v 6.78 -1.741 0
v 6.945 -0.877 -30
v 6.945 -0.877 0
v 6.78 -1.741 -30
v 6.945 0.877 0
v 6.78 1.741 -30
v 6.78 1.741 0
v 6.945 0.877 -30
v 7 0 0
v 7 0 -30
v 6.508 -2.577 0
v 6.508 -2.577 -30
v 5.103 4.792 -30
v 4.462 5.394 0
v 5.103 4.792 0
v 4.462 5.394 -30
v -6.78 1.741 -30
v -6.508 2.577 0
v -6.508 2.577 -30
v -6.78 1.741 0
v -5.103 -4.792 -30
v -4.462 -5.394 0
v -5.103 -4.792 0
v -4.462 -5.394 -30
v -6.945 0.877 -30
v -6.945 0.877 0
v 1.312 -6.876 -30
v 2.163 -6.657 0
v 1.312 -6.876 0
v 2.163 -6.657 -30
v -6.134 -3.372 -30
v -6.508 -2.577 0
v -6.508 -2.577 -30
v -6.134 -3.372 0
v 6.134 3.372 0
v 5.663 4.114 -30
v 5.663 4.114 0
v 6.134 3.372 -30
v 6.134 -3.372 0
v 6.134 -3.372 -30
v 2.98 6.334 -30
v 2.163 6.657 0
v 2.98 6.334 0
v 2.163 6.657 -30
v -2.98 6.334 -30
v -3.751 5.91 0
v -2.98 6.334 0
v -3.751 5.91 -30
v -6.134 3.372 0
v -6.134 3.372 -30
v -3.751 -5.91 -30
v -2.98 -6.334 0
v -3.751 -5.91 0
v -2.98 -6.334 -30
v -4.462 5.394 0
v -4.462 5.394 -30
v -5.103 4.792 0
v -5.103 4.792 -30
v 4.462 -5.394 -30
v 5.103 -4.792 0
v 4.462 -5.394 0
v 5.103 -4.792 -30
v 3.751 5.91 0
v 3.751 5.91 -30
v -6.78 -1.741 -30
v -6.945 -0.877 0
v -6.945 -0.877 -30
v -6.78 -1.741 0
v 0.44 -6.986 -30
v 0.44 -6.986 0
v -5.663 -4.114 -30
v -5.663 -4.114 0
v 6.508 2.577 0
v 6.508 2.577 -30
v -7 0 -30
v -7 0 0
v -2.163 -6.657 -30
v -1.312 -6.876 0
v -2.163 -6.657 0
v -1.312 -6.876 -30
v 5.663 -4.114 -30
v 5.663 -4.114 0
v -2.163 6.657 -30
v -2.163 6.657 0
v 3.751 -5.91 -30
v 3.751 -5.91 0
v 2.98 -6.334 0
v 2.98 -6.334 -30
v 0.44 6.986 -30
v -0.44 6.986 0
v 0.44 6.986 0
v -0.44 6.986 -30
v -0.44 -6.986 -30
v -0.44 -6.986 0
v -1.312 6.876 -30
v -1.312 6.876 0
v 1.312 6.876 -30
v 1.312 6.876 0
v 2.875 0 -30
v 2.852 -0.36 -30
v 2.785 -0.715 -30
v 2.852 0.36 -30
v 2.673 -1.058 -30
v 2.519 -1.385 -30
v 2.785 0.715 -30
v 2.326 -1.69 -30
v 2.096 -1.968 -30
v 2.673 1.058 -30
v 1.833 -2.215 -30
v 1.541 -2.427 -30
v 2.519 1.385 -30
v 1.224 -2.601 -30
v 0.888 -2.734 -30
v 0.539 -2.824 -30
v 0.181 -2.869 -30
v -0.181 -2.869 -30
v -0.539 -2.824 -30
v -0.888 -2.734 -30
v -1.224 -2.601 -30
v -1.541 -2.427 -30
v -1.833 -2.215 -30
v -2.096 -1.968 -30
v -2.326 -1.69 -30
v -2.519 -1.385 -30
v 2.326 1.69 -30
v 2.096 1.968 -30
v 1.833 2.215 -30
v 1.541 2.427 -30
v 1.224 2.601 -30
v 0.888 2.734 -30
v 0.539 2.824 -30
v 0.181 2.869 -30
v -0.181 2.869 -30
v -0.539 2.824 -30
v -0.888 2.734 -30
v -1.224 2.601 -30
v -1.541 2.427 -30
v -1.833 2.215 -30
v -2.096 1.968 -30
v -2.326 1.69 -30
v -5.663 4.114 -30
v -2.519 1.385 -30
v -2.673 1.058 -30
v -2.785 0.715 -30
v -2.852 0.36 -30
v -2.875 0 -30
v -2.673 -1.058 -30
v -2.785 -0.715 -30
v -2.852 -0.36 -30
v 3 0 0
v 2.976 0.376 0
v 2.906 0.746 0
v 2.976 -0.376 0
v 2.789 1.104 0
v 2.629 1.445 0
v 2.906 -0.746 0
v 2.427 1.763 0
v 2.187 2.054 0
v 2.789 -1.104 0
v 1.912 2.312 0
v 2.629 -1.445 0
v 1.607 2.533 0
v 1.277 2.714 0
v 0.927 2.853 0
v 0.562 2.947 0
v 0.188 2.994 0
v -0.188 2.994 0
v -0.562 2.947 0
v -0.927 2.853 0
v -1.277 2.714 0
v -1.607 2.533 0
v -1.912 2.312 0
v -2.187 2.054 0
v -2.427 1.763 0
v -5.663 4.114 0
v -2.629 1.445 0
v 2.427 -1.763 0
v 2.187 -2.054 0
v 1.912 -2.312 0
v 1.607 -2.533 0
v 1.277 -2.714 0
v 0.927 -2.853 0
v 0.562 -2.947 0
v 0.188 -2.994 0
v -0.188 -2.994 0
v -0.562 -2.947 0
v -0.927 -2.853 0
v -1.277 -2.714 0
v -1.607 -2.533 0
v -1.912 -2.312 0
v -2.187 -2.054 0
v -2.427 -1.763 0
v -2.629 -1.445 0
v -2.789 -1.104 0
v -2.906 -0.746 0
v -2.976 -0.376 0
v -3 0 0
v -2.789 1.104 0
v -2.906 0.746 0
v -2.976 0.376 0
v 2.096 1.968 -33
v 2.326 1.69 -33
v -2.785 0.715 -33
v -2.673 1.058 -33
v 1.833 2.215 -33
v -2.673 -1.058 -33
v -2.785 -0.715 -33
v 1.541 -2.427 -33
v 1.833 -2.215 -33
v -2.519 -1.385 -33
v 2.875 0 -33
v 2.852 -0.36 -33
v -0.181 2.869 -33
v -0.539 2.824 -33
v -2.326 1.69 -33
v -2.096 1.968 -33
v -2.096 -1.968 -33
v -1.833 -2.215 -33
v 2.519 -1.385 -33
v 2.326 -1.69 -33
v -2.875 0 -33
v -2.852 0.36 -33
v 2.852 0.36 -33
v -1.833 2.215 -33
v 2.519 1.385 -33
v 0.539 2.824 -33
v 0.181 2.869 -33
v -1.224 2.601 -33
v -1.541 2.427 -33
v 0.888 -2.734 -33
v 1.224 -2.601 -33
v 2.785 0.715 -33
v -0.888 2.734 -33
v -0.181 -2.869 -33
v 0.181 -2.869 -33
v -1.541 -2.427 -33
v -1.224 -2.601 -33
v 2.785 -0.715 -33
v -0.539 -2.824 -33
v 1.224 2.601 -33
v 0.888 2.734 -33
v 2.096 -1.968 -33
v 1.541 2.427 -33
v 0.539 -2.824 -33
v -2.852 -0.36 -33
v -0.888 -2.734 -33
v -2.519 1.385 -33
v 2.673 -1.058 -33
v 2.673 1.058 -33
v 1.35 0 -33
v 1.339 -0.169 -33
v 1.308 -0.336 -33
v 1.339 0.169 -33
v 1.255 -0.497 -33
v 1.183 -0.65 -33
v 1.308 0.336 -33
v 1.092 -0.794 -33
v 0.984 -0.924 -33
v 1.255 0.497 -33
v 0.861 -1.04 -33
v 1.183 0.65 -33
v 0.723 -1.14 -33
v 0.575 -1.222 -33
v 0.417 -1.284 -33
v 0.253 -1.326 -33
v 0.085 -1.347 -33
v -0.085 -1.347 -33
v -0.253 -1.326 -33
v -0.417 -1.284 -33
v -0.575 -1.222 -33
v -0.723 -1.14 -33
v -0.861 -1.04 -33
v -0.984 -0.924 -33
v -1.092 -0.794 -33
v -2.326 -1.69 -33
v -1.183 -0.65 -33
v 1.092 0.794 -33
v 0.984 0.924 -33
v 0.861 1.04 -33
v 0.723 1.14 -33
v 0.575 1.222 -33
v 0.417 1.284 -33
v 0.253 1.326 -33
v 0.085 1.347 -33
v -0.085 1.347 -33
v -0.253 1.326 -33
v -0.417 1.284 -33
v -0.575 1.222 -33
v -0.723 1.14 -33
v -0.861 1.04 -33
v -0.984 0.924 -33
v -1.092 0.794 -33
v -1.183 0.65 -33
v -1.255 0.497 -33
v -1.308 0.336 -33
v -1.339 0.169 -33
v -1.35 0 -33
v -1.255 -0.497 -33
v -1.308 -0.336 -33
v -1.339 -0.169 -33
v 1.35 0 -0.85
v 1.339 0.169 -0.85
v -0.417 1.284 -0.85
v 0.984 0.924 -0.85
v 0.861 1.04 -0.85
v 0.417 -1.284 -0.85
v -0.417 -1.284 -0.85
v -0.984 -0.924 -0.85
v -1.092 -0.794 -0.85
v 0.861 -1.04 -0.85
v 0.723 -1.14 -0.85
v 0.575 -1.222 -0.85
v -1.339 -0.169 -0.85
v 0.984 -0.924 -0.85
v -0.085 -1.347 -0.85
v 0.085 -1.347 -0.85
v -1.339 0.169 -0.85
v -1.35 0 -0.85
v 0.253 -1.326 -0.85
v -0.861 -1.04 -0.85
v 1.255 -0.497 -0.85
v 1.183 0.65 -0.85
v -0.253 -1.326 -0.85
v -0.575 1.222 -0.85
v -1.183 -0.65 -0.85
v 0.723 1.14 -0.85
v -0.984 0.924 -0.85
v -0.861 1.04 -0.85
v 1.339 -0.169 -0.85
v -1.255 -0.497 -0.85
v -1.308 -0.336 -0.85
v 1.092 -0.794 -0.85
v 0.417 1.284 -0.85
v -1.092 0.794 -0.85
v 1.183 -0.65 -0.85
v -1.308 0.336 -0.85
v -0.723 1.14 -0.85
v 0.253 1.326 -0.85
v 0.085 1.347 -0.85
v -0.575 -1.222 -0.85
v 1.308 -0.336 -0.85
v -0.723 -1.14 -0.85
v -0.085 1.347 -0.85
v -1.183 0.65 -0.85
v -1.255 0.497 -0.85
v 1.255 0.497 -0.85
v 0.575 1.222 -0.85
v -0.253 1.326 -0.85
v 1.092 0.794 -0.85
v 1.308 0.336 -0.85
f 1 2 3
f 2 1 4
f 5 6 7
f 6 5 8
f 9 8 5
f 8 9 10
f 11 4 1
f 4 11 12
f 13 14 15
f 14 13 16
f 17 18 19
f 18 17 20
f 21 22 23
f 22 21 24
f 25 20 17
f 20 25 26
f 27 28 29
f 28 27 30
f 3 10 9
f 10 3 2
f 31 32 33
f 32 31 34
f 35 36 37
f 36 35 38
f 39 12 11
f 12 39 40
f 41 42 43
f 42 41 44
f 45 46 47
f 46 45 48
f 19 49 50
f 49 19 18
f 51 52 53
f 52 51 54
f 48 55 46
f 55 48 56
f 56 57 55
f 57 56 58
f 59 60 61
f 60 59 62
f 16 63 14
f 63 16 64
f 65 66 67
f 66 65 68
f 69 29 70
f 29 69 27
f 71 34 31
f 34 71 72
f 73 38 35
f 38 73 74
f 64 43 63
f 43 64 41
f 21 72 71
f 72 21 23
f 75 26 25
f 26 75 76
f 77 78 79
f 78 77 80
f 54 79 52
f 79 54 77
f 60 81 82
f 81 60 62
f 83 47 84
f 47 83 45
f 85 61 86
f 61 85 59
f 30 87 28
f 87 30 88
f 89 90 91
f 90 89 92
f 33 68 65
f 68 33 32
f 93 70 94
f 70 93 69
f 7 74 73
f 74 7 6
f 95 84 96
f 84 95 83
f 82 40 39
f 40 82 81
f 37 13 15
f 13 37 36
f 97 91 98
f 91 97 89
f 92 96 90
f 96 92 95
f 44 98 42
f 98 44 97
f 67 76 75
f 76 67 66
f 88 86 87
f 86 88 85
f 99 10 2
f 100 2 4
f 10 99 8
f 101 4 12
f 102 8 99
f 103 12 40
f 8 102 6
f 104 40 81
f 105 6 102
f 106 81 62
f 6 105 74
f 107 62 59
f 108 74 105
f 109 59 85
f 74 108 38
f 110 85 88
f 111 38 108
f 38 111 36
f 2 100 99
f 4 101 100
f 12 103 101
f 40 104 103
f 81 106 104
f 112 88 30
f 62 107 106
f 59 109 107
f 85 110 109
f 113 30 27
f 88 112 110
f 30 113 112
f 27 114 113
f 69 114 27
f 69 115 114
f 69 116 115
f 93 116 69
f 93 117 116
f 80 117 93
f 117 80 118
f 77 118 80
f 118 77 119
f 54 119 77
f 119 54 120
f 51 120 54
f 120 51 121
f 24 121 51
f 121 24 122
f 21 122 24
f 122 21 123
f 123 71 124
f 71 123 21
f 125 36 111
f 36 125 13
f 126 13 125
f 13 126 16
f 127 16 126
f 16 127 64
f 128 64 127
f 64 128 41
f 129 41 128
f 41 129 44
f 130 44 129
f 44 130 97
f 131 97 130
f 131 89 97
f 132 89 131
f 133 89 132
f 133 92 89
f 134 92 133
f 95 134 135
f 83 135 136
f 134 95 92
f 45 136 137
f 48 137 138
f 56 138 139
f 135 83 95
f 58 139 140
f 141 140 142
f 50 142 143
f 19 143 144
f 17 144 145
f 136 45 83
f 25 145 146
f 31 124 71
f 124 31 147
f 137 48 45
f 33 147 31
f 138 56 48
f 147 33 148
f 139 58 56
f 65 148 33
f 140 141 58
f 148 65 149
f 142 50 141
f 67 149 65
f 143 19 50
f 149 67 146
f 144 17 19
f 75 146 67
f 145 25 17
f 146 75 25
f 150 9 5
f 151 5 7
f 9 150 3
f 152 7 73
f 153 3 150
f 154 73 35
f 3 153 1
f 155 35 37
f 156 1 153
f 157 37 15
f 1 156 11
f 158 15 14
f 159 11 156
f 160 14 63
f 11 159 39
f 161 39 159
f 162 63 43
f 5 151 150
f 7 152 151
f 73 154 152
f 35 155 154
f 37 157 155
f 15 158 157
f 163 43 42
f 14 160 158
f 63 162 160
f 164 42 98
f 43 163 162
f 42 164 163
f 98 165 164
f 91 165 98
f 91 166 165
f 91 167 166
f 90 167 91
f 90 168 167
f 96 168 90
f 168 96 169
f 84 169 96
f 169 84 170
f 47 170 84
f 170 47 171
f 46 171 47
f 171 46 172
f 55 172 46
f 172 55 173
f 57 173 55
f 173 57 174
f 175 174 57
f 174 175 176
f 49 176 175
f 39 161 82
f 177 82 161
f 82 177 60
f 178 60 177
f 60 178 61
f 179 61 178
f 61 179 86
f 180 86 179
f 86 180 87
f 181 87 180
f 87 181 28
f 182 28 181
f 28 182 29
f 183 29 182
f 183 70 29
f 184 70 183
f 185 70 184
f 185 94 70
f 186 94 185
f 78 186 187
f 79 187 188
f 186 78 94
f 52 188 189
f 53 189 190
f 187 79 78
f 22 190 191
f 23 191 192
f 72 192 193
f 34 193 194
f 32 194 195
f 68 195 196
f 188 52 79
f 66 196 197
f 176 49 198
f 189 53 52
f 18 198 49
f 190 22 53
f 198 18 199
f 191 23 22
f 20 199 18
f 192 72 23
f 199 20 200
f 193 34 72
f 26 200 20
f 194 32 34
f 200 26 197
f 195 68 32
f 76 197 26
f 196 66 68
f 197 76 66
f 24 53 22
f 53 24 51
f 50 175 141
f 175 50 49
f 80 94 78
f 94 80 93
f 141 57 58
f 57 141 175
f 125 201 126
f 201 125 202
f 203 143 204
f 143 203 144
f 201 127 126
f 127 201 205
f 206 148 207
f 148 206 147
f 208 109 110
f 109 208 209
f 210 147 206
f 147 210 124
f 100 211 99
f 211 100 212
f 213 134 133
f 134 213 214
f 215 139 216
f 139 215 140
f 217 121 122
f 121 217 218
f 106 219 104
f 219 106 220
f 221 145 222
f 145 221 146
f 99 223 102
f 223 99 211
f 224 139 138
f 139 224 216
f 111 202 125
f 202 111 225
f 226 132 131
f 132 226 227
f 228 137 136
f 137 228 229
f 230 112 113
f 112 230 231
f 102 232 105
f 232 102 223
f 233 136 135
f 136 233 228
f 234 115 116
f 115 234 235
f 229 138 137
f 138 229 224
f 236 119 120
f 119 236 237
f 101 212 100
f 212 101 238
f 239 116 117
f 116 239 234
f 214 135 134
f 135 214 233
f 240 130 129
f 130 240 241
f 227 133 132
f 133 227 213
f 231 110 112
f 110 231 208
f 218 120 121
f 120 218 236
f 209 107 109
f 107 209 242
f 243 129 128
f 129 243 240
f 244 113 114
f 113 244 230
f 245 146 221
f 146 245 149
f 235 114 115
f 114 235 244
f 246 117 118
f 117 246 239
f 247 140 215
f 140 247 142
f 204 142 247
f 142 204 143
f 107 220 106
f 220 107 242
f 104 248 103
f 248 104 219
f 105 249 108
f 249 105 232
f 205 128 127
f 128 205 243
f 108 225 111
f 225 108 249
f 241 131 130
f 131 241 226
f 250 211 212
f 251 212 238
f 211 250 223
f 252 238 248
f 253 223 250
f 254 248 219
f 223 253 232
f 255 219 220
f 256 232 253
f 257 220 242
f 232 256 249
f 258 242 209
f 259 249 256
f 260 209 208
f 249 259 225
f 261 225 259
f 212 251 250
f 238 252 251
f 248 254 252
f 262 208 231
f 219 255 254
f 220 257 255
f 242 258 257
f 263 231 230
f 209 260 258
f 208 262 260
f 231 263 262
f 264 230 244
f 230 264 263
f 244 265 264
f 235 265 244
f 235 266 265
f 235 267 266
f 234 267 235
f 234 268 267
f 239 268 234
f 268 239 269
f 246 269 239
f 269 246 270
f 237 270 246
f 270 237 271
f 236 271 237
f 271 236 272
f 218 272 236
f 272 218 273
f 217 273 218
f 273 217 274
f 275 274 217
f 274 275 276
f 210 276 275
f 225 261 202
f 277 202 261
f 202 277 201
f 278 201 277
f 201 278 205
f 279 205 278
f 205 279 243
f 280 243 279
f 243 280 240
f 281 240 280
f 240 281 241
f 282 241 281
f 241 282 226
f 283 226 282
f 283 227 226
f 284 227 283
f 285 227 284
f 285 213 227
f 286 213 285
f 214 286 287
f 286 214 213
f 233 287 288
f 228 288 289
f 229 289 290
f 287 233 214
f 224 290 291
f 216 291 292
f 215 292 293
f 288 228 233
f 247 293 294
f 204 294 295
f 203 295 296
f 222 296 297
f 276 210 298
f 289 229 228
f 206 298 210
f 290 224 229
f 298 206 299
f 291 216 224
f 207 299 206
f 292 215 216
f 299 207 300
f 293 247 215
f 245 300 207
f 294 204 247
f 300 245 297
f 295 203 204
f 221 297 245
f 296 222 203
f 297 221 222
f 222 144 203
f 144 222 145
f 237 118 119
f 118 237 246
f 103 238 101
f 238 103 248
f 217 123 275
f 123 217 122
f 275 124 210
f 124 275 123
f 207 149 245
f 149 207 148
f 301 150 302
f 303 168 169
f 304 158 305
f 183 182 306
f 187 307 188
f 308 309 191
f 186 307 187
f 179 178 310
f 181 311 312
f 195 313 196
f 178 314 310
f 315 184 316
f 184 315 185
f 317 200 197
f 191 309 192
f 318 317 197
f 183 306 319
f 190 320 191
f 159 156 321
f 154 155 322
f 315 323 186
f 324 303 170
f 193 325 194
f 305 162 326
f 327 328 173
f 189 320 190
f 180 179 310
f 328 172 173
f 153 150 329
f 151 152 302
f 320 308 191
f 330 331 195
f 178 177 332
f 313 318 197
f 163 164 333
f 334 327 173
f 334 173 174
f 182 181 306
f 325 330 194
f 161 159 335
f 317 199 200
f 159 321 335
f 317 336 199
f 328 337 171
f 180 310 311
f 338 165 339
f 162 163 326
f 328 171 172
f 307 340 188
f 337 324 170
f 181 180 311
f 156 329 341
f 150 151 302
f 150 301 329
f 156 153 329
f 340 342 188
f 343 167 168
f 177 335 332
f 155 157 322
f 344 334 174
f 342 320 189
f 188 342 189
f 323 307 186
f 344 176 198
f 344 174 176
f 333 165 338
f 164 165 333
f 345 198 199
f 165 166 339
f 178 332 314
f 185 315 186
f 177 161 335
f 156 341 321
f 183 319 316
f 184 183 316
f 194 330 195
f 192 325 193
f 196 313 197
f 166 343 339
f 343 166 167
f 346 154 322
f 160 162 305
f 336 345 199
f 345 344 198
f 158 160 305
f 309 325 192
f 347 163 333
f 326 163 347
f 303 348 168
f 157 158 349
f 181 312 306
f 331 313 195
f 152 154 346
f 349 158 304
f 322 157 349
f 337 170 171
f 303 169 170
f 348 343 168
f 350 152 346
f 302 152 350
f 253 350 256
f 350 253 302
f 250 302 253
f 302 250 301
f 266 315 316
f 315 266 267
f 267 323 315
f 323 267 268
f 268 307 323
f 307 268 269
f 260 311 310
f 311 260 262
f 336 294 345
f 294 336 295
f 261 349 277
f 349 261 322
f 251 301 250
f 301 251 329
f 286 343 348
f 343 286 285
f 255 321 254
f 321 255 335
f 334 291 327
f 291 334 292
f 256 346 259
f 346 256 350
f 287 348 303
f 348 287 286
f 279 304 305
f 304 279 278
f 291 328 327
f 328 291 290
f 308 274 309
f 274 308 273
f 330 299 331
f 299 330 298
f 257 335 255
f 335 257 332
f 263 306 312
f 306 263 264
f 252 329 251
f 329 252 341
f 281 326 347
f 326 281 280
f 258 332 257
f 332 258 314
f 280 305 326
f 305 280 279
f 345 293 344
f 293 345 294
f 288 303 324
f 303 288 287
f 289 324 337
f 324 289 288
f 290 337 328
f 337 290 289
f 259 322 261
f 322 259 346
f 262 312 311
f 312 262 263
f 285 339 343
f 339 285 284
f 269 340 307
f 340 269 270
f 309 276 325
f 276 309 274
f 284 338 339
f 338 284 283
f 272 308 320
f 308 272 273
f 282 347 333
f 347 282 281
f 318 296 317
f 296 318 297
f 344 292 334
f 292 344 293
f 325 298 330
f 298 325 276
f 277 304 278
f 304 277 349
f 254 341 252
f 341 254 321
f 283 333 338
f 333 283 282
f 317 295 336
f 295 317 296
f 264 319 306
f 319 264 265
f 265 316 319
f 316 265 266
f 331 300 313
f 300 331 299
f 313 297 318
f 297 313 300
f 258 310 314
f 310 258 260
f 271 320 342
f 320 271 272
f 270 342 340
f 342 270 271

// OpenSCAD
$fn = 50;

difference() {
	union() {
		translate(v = [0, 0, -30.0]) {
			cylinder(h = 30, r = 7.0);
		}
		#translate(v = [0, 0, -33.0]) {
			cylinder(h = 33, r = 2.875);
		}
	}
	union() {
		translate(v = [0, 0, 0]) {
			rotate(a = [0, 0, 0]) {
				difference() {
					union() {
						translate(v = [0, 0, -33.0]) {
							cylinder(h = 33, r = 1.0);
						}
						translate(v = [0, 0, -0.85]) {
							cylinder(h = 0.85, r1 = 1.35, r2 = 3.0);
						}
						translate(v = [0, 0, -33.0]) {
							cylinder(h = 33, r = 1.35);
						}
						translate(v = [0, 0, -33.0]) {
							cylinder(h = 33, r = 1.0);
						}
					}
					union();
				}
			}
		}
	}
}
